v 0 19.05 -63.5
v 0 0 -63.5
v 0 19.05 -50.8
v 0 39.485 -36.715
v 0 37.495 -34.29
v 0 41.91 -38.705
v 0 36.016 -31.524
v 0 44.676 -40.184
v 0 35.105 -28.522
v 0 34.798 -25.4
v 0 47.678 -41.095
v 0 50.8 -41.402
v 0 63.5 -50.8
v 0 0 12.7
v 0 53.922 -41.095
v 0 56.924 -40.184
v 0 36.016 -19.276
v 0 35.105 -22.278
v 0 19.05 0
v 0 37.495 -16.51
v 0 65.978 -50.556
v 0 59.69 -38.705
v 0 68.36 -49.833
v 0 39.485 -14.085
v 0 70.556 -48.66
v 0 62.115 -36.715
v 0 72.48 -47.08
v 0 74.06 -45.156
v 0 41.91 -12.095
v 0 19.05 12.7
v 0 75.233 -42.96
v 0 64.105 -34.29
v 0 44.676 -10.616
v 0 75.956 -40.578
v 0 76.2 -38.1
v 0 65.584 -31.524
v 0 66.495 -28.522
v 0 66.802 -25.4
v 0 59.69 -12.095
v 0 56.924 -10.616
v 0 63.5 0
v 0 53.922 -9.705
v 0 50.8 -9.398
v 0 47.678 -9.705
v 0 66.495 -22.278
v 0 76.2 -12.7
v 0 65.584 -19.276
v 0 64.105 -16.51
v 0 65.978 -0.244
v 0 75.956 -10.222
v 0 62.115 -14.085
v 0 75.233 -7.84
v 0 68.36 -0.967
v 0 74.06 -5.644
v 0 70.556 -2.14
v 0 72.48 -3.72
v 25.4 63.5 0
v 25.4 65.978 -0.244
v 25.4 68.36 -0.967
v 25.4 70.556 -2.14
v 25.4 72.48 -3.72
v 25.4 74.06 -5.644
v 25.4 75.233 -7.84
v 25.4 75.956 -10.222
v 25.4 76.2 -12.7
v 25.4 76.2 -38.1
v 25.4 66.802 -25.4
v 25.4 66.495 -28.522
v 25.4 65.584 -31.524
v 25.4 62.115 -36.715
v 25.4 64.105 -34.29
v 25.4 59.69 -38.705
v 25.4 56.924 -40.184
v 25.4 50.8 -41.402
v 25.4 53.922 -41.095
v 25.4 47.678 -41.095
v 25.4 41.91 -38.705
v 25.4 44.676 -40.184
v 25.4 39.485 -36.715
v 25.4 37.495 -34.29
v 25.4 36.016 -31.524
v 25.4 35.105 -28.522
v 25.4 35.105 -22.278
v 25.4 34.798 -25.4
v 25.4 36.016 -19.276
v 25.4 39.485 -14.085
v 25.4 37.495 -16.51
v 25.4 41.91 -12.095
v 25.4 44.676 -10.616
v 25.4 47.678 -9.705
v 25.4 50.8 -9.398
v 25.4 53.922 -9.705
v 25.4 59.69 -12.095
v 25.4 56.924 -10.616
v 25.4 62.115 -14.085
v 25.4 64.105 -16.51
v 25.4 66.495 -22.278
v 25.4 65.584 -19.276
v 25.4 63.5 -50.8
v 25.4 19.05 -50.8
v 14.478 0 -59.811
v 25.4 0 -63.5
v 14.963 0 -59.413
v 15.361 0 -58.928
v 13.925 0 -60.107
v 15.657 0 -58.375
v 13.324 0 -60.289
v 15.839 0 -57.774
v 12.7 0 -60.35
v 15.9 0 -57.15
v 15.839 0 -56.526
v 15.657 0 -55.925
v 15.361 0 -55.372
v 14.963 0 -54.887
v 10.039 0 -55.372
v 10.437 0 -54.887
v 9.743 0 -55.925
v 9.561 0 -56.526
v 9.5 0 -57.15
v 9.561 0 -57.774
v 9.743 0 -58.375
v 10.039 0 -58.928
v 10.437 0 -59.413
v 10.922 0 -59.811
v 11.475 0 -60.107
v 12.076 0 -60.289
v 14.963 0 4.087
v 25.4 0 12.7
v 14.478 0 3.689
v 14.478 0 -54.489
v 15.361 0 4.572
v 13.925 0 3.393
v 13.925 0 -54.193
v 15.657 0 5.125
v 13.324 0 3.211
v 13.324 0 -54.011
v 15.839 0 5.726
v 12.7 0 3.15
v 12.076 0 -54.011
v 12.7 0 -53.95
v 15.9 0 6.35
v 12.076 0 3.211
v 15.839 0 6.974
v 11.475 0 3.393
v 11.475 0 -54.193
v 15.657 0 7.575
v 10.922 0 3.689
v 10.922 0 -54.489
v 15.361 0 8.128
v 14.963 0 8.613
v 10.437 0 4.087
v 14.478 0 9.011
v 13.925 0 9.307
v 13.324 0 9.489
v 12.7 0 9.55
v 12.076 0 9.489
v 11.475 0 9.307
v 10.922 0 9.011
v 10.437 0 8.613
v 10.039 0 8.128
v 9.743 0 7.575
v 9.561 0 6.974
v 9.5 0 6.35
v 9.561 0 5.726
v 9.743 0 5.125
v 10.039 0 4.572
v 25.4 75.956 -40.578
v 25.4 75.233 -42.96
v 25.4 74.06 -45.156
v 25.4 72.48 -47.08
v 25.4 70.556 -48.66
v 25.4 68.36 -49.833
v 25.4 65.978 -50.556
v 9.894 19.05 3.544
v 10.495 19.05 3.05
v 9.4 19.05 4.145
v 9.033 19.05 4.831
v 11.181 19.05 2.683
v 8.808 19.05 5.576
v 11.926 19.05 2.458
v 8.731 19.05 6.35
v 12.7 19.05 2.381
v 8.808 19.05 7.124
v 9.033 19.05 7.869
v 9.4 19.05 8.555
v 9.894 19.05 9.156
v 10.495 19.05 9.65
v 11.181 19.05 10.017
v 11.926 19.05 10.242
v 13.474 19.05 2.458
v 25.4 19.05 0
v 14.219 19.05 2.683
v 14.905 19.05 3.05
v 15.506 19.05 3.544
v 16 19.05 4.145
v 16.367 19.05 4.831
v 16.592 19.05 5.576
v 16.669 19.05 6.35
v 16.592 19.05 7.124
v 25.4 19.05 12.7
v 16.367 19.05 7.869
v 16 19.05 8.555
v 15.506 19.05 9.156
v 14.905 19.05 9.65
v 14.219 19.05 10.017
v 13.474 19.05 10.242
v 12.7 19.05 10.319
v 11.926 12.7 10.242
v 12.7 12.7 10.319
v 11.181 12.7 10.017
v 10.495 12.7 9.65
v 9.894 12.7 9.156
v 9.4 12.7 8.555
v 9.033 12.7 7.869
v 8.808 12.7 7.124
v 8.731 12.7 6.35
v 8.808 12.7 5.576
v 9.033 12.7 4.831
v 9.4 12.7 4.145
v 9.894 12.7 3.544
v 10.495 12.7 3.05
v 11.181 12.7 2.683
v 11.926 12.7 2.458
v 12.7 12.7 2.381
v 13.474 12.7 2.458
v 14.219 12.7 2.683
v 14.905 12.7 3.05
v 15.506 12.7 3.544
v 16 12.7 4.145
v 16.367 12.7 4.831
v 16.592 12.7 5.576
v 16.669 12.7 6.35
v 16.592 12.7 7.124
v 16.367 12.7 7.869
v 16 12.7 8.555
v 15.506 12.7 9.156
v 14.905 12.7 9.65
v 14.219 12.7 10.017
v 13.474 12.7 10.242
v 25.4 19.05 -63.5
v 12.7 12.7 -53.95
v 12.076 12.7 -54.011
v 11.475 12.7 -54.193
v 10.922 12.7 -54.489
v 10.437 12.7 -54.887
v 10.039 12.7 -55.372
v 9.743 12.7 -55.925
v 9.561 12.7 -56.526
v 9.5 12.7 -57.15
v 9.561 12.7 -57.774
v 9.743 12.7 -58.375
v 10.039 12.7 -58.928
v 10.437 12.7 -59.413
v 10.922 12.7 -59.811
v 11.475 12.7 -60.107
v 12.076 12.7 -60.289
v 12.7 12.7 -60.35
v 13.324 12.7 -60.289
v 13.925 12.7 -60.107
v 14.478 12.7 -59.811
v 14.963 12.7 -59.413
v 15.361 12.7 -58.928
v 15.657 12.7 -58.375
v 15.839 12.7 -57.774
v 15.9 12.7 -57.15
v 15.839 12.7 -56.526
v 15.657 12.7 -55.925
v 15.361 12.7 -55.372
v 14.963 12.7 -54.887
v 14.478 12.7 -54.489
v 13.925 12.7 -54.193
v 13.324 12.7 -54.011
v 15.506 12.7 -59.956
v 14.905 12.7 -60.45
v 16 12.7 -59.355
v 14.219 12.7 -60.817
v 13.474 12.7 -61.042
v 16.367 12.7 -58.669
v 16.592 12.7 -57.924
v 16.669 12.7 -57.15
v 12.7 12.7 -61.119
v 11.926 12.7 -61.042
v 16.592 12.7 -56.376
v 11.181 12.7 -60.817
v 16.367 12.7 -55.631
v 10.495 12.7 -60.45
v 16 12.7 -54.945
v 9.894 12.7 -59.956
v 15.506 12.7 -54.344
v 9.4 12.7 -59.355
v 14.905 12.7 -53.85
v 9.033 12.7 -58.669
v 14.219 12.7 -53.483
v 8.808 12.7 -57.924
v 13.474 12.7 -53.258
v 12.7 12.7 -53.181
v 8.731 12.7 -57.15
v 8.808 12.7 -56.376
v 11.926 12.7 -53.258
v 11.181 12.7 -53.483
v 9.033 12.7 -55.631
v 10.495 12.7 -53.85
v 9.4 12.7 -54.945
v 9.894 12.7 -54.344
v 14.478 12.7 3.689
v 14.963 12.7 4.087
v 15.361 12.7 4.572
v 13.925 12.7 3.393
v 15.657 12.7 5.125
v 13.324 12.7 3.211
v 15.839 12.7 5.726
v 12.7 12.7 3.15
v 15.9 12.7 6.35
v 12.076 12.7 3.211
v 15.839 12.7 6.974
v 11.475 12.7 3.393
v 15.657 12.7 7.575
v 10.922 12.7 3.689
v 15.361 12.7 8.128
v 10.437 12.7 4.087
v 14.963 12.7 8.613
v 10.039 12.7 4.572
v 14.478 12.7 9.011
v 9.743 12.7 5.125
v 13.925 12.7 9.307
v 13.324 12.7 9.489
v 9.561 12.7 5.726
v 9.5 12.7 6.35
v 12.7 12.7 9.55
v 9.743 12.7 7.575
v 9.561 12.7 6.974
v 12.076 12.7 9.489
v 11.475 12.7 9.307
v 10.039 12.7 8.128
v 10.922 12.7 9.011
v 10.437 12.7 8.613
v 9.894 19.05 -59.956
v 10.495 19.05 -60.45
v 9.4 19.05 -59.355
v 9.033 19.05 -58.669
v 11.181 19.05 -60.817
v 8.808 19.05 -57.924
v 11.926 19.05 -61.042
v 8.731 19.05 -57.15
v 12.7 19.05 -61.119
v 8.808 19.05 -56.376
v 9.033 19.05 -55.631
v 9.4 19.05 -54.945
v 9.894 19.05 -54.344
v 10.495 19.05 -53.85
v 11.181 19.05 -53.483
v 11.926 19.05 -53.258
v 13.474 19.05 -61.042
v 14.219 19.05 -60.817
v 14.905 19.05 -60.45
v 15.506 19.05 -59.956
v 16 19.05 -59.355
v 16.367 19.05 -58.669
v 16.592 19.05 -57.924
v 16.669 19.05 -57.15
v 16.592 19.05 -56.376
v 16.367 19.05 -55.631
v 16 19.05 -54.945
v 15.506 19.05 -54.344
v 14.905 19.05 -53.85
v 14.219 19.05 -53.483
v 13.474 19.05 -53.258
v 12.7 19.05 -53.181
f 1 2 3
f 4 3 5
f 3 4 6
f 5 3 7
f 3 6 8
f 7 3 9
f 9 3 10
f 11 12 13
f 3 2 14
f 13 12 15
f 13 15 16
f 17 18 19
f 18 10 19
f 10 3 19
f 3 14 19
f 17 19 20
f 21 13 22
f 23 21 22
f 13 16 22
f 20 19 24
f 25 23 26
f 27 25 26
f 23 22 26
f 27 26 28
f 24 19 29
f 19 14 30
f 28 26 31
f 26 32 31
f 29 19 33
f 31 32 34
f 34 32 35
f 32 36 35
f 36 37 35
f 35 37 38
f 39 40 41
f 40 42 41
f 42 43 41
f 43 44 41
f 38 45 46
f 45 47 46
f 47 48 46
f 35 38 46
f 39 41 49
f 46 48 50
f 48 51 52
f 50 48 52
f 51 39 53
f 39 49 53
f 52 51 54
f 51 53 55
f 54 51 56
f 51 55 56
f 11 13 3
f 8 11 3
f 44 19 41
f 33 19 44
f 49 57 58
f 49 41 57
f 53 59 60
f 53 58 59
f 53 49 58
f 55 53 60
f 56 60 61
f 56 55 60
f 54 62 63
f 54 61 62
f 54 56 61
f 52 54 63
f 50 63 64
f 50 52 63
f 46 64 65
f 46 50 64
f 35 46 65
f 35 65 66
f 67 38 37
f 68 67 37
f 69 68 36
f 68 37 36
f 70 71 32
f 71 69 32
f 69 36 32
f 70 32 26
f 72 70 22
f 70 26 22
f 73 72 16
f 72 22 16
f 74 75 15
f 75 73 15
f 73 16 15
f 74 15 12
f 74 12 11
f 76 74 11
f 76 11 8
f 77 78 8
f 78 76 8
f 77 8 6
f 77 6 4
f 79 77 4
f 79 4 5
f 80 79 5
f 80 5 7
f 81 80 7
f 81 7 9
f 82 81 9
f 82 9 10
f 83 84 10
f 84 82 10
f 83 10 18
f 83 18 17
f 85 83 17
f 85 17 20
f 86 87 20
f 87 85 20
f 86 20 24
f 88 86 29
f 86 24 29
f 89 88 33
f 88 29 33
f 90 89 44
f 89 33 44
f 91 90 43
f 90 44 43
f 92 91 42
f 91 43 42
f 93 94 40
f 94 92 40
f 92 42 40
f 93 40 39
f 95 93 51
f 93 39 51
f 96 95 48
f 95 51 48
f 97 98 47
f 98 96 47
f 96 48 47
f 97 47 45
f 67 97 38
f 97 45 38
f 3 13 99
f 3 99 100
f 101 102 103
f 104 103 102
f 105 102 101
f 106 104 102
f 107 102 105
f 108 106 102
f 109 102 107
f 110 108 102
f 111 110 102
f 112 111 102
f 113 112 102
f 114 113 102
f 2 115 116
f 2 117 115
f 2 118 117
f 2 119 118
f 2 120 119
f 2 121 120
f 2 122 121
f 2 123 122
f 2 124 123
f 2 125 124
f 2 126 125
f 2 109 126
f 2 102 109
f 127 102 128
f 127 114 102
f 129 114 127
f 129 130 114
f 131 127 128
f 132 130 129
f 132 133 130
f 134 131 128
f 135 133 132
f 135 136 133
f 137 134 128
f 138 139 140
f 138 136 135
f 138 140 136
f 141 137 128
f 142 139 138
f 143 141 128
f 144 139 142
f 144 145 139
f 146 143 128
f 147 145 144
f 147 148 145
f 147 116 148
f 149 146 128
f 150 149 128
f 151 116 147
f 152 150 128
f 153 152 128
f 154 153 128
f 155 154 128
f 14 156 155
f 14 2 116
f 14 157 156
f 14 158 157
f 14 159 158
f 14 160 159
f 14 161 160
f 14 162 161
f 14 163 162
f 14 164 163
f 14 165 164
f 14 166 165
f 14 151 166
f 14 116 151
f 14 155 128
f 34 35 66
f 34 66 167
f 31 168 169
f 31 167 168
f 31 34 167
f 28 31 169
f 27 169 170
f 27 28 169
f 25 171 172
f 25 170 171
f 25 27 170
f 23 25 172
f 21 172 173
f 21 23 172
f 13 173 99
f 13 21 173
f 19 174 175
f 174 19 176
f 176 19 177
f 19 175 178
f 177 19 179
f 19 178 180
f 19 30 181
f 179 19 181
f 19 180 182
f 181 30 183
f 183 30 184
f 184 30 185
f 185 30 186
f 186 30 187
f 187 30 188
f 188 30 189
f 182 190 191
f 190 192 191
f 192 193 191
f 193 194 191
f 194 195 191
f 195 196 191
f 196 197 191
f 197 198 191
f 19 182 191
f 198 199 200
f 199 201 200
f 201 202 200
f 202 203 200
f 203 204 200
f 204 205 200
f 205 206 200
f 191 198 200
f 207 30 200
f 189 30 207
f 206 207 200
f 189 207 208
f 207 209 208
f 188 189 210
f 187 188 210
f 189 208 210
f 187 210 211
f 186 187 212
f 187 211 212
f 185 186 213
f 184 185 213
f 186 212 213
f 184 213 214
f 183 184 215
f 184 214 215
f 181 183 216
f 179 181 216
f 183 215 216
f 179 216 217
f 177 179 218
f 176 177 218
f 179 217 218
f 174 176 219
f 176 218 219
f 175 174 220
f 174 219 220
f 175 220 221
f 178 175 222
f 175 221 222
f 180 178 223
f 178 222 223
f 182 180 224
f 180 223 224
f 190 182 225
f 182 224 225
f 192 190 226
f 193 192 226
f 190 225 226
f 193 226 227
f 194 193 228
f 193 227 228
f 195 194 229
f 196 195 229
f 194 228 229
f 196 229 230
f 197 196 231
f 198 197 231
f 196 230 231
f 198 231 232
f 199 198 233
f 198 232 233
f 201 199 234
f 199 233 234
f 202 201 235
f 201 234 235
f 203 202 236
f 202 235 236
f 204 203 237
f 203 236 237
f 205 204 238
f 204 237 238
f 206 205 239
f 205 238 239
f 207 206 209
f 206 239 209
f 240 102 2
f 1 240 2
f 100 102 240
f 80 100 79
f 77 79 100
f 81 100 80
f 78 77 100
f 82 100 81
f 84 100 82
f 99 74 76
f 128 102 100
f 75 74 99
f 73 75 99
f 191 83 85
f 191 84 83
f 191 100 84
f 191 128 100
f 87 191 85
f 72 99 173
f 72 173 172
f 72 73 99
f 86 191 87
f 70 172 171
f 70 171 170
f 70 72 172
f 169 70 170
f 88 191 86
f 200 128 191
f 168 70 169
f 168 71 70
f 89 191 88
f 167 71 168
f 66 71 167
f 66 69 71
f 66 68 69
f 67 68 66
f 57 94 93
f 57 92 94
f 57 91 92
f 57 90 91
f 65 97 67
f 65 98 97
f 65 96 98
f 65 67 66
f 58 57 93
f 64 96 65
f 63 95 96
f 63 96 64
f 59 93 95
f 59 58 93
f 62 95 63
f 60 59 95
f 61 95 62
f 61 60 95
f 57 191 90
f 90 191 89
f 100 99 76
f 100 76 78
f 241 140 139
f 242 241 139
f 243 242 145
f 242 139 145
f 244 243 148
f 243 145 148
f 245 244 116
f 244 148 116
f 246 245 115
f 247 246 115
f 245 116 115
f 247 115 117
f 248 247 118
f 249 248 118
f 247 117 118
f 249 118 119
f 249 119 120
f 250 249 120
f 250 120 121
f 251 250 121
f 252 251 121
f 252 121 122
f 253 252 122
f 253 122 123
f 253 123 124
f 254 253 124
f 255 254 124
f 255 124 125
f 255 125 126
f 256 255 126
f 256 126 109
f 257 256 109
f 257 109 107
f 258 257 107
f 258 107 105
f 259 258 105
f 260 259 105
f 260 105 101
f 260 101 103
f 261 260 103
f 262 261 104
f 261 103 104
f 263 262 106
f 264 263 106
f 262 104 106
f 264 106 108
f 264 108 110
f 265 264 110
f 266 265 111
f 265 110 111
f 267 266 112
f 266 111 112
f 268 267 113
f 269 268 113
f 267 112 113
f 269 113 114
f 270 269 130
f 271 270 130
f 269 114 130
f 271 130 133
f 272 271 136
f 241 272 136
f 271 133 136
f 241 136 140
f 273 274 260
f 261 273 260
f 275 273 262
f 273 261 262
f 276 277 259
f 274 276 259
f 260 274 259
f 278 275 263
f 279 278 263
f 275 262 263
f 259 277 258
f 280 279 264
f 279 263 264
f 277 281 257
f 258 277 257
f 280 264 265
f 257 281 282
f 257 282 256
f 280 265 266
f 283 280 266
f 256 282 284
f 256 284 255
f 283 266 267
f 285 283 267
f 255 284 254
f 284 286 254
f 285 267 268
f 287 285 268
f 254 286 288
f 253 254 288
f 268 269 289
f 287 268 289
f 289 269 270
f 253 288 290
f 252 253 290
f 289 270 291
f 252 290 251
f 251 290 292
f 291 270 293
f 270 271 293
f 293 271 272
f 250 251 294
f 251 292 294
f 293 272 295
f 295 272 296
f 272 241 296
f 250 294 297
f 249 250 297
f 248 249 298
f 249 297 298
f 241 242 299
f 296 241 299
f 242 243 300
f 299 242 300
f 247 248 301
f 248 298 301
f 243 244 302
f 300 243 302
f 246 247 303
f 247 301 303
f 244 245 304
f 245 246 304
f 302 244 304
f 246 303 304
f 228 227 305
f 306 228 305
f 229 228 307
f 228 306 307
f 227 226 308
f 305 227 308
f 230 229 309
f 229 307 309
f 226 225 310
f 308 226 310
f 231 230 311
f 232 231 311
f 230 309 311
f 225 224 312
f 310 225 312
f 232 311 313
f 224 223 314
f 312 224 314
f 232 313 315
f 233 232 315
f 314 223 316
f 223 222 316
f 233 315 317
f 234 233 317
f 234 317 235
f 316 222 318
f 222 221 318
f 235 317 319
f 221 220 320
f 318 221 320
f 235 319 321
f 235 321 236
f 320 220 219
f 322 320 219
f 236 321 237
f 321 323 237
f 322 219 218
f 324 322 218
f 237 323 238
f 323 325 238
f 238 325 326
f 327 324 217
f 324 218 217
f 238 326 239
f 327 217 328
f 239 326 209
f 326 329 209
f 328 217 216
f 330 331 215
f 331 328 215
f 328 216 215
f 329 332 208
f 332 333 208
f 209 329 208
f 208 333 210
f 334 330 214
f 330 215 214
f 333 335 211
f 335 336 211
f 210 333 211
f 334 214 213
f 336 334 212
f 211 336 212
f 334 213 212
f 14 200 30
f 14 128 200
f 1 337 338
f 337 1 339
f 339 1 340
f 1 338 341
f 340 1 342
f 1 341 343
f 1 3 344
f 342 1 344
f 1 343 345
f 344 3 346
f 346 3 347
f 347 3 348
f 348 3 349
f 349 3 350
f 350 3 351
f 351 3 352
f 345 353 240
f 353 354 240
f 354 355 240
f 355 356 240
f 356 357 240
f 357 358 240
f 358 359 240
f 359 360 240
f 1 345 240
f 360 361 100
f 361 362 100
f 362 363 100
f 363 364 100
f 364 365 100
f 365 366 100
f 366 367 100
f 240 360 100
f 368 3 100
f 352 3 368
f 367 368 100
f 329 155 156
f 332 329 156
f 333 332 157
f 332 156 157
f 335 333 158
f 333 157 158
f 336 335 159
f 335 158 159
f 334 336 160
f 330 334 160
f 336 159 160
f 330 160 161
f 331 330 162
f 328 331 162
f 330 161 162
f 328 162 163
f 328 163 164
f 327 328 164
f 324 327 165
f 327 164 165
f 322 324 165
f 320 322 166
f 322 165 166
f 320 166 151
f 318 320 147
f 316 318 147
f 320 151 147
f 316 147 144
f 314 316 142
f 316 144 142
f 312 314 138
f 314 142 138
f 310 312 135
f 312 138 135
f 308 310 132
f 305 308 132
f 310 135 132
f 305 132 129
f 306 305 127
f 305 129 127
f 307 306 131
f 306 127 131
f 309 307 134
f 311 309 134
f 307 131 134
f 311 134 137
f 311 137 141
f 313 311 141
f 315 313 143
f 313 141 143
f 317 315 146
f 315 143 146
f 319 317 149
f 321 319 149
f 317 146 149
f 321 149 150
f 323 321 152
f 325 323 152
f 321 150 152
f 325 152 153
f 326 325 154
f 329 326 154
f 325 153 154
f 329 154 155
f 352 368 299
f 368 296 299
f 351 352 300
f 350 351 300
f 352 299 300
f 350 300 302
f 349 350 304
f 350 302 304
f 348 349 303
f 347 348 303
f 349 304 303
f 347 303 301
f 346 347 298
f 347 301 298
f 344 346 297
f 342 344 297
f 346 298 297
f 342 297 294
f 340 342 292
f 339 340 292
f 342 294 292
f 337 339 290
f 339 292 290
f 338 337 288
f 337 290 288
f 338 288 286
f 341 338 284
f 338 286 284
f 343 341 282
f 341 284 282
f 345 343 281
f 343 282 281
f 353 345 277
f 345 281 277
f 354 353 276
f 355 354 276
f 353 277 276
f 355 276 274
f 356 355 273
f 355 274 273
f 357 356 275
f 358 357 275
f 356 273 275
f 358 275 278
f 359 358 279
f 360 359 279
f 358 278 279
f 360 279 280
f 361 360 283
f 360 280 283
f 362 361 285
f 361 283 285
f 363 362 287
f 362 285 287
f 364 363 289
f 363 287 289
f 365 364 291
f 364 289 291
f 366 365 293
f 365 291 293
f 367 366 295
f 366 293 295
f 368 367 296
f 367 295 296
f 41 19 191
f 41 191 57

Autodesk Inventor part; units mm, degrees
ref_plane "YZ Plane" through (0, 0, 0) normal (1, 0, 0) x (0, 1, 0)
ref_plane "XZ Plane" through (0, 0, 0) normal (0, 1, 0) x (-1, 0, 0)
ref_plane "XY Plane" through (0, 0, 0) normal (0, 0, 1) x (1, 0, 0)
sketch "Sketch1" plane through (0, 0, 0) normal (1, 0, 0) x (0, 1, 0)
  line L0 (0, 0) -> (63.5, 0)
  line L1 (76.2, -12.7) -> (76.2, -38.1)
  line L2 (63.5, -50.8) -> (0, -50.8)
  line L3 (0, -50.8) -> (0, 0)
  circle A0 centre (50.8, -25.4) radius 16.002
  arc A1 (76.2, -12.7) -> (63.5, 0) centre (63.5, -12.7) ccw
  arc A2 (63.5, -50.8) -> (76.2, -38.1) centre (63.5, -38.1) ccw
  point P0 (76.2, -50.8)
  point P1 (76.2, 0)
  dimension "d1" = 76.2
  dimension "d2" = 50.8
  dimension "d6" = 32.004
  dimension "d7" = 12.7
extrude "Extrusion1" add sketch "Sketch1" along normal blind 25.4
ref_plane "Work Plane1" through (0, 0, -50.8) normal (0, -1, 0) x (1, 0, 0)
sketch "Sketch2" plane through (0, 0, -50.8) normal (0, -1, 0) x (1, 0, 0)
  line L0 (0, 50.8) -> (25.4, 50.8)
  line L1 (25.4, 50.8) -> (25.4, 63.5)
  line L2 (25.4, 63.5) -> (0, 63.5)
  line L3 (0, 63.5) -> (0, 50.8)
  line L4 (0, 50.8) -> (0, 0) projected
  line L5 (0, 0) -> (25.4, 0)
  line L6 (25.4, 0) -> (25.4, -12.7)
  line L7 (25.4, -12.7) -> (0, -12.7)
  line L8 (0, -12.7) -> (0, 0)
  circle A0 centre (12.7, 57.15) radius 3.9687
  circle A1 centre (12.7, -6.35) radius 3.9688
  dimension "d11" = 25.4
  dimension "d12" = 25.4
  dimension "d13" = 12.7
  dimension "d14" = 12.7
  dimension "d15" = 7.9375
  dimension "d16" = 7.9375
extrude "Extrusion2" add sketch "Sketch2" against normal blind 19.05 contours L3 L2 L1 L0 | L5 L6 L7 L8 | A0 | A1
sketch "Sketch3" plane through (0, 19.05, -50.8) normal (0, 1, 0) x (1, 0, 0)
  line L0 (0, -63.5) -> (25.4, -63.5) projected
  circle A0 centre (12.7, -57.15) radius 3.9688
  line L1 (25.4, 12.7) -> (0, 12.7) projected
  circle A1 centre (12.7, 6.35) radius 3.9688
  point P0 (0, -50.8)
  dimension "d20" = 7.9375
hole "Hole1" at (12.7, 19.05, -57.15) direction (0, -1, 0) diameter 6.4008 end through all counterbore diameter 7.9375 counterbore depth 6.35 thread size "5/16-18 UNC" class "2B" standard "ANSI Unified Screw Threads"
hole "Hole2" at (12.7, 19.05, 6.35) direction (0, -1, 0) diameter 6.4008 end through all counterbore diameter 7.9375 counterbore depth 6.35 thread size "5/16-18 UNC" class "2B" standard "ANSI Unified Screw Threads"
equation "\"d23\" = d12"
equation "\"d30\" = d12"
properties part number "motor_mount_wrist"
